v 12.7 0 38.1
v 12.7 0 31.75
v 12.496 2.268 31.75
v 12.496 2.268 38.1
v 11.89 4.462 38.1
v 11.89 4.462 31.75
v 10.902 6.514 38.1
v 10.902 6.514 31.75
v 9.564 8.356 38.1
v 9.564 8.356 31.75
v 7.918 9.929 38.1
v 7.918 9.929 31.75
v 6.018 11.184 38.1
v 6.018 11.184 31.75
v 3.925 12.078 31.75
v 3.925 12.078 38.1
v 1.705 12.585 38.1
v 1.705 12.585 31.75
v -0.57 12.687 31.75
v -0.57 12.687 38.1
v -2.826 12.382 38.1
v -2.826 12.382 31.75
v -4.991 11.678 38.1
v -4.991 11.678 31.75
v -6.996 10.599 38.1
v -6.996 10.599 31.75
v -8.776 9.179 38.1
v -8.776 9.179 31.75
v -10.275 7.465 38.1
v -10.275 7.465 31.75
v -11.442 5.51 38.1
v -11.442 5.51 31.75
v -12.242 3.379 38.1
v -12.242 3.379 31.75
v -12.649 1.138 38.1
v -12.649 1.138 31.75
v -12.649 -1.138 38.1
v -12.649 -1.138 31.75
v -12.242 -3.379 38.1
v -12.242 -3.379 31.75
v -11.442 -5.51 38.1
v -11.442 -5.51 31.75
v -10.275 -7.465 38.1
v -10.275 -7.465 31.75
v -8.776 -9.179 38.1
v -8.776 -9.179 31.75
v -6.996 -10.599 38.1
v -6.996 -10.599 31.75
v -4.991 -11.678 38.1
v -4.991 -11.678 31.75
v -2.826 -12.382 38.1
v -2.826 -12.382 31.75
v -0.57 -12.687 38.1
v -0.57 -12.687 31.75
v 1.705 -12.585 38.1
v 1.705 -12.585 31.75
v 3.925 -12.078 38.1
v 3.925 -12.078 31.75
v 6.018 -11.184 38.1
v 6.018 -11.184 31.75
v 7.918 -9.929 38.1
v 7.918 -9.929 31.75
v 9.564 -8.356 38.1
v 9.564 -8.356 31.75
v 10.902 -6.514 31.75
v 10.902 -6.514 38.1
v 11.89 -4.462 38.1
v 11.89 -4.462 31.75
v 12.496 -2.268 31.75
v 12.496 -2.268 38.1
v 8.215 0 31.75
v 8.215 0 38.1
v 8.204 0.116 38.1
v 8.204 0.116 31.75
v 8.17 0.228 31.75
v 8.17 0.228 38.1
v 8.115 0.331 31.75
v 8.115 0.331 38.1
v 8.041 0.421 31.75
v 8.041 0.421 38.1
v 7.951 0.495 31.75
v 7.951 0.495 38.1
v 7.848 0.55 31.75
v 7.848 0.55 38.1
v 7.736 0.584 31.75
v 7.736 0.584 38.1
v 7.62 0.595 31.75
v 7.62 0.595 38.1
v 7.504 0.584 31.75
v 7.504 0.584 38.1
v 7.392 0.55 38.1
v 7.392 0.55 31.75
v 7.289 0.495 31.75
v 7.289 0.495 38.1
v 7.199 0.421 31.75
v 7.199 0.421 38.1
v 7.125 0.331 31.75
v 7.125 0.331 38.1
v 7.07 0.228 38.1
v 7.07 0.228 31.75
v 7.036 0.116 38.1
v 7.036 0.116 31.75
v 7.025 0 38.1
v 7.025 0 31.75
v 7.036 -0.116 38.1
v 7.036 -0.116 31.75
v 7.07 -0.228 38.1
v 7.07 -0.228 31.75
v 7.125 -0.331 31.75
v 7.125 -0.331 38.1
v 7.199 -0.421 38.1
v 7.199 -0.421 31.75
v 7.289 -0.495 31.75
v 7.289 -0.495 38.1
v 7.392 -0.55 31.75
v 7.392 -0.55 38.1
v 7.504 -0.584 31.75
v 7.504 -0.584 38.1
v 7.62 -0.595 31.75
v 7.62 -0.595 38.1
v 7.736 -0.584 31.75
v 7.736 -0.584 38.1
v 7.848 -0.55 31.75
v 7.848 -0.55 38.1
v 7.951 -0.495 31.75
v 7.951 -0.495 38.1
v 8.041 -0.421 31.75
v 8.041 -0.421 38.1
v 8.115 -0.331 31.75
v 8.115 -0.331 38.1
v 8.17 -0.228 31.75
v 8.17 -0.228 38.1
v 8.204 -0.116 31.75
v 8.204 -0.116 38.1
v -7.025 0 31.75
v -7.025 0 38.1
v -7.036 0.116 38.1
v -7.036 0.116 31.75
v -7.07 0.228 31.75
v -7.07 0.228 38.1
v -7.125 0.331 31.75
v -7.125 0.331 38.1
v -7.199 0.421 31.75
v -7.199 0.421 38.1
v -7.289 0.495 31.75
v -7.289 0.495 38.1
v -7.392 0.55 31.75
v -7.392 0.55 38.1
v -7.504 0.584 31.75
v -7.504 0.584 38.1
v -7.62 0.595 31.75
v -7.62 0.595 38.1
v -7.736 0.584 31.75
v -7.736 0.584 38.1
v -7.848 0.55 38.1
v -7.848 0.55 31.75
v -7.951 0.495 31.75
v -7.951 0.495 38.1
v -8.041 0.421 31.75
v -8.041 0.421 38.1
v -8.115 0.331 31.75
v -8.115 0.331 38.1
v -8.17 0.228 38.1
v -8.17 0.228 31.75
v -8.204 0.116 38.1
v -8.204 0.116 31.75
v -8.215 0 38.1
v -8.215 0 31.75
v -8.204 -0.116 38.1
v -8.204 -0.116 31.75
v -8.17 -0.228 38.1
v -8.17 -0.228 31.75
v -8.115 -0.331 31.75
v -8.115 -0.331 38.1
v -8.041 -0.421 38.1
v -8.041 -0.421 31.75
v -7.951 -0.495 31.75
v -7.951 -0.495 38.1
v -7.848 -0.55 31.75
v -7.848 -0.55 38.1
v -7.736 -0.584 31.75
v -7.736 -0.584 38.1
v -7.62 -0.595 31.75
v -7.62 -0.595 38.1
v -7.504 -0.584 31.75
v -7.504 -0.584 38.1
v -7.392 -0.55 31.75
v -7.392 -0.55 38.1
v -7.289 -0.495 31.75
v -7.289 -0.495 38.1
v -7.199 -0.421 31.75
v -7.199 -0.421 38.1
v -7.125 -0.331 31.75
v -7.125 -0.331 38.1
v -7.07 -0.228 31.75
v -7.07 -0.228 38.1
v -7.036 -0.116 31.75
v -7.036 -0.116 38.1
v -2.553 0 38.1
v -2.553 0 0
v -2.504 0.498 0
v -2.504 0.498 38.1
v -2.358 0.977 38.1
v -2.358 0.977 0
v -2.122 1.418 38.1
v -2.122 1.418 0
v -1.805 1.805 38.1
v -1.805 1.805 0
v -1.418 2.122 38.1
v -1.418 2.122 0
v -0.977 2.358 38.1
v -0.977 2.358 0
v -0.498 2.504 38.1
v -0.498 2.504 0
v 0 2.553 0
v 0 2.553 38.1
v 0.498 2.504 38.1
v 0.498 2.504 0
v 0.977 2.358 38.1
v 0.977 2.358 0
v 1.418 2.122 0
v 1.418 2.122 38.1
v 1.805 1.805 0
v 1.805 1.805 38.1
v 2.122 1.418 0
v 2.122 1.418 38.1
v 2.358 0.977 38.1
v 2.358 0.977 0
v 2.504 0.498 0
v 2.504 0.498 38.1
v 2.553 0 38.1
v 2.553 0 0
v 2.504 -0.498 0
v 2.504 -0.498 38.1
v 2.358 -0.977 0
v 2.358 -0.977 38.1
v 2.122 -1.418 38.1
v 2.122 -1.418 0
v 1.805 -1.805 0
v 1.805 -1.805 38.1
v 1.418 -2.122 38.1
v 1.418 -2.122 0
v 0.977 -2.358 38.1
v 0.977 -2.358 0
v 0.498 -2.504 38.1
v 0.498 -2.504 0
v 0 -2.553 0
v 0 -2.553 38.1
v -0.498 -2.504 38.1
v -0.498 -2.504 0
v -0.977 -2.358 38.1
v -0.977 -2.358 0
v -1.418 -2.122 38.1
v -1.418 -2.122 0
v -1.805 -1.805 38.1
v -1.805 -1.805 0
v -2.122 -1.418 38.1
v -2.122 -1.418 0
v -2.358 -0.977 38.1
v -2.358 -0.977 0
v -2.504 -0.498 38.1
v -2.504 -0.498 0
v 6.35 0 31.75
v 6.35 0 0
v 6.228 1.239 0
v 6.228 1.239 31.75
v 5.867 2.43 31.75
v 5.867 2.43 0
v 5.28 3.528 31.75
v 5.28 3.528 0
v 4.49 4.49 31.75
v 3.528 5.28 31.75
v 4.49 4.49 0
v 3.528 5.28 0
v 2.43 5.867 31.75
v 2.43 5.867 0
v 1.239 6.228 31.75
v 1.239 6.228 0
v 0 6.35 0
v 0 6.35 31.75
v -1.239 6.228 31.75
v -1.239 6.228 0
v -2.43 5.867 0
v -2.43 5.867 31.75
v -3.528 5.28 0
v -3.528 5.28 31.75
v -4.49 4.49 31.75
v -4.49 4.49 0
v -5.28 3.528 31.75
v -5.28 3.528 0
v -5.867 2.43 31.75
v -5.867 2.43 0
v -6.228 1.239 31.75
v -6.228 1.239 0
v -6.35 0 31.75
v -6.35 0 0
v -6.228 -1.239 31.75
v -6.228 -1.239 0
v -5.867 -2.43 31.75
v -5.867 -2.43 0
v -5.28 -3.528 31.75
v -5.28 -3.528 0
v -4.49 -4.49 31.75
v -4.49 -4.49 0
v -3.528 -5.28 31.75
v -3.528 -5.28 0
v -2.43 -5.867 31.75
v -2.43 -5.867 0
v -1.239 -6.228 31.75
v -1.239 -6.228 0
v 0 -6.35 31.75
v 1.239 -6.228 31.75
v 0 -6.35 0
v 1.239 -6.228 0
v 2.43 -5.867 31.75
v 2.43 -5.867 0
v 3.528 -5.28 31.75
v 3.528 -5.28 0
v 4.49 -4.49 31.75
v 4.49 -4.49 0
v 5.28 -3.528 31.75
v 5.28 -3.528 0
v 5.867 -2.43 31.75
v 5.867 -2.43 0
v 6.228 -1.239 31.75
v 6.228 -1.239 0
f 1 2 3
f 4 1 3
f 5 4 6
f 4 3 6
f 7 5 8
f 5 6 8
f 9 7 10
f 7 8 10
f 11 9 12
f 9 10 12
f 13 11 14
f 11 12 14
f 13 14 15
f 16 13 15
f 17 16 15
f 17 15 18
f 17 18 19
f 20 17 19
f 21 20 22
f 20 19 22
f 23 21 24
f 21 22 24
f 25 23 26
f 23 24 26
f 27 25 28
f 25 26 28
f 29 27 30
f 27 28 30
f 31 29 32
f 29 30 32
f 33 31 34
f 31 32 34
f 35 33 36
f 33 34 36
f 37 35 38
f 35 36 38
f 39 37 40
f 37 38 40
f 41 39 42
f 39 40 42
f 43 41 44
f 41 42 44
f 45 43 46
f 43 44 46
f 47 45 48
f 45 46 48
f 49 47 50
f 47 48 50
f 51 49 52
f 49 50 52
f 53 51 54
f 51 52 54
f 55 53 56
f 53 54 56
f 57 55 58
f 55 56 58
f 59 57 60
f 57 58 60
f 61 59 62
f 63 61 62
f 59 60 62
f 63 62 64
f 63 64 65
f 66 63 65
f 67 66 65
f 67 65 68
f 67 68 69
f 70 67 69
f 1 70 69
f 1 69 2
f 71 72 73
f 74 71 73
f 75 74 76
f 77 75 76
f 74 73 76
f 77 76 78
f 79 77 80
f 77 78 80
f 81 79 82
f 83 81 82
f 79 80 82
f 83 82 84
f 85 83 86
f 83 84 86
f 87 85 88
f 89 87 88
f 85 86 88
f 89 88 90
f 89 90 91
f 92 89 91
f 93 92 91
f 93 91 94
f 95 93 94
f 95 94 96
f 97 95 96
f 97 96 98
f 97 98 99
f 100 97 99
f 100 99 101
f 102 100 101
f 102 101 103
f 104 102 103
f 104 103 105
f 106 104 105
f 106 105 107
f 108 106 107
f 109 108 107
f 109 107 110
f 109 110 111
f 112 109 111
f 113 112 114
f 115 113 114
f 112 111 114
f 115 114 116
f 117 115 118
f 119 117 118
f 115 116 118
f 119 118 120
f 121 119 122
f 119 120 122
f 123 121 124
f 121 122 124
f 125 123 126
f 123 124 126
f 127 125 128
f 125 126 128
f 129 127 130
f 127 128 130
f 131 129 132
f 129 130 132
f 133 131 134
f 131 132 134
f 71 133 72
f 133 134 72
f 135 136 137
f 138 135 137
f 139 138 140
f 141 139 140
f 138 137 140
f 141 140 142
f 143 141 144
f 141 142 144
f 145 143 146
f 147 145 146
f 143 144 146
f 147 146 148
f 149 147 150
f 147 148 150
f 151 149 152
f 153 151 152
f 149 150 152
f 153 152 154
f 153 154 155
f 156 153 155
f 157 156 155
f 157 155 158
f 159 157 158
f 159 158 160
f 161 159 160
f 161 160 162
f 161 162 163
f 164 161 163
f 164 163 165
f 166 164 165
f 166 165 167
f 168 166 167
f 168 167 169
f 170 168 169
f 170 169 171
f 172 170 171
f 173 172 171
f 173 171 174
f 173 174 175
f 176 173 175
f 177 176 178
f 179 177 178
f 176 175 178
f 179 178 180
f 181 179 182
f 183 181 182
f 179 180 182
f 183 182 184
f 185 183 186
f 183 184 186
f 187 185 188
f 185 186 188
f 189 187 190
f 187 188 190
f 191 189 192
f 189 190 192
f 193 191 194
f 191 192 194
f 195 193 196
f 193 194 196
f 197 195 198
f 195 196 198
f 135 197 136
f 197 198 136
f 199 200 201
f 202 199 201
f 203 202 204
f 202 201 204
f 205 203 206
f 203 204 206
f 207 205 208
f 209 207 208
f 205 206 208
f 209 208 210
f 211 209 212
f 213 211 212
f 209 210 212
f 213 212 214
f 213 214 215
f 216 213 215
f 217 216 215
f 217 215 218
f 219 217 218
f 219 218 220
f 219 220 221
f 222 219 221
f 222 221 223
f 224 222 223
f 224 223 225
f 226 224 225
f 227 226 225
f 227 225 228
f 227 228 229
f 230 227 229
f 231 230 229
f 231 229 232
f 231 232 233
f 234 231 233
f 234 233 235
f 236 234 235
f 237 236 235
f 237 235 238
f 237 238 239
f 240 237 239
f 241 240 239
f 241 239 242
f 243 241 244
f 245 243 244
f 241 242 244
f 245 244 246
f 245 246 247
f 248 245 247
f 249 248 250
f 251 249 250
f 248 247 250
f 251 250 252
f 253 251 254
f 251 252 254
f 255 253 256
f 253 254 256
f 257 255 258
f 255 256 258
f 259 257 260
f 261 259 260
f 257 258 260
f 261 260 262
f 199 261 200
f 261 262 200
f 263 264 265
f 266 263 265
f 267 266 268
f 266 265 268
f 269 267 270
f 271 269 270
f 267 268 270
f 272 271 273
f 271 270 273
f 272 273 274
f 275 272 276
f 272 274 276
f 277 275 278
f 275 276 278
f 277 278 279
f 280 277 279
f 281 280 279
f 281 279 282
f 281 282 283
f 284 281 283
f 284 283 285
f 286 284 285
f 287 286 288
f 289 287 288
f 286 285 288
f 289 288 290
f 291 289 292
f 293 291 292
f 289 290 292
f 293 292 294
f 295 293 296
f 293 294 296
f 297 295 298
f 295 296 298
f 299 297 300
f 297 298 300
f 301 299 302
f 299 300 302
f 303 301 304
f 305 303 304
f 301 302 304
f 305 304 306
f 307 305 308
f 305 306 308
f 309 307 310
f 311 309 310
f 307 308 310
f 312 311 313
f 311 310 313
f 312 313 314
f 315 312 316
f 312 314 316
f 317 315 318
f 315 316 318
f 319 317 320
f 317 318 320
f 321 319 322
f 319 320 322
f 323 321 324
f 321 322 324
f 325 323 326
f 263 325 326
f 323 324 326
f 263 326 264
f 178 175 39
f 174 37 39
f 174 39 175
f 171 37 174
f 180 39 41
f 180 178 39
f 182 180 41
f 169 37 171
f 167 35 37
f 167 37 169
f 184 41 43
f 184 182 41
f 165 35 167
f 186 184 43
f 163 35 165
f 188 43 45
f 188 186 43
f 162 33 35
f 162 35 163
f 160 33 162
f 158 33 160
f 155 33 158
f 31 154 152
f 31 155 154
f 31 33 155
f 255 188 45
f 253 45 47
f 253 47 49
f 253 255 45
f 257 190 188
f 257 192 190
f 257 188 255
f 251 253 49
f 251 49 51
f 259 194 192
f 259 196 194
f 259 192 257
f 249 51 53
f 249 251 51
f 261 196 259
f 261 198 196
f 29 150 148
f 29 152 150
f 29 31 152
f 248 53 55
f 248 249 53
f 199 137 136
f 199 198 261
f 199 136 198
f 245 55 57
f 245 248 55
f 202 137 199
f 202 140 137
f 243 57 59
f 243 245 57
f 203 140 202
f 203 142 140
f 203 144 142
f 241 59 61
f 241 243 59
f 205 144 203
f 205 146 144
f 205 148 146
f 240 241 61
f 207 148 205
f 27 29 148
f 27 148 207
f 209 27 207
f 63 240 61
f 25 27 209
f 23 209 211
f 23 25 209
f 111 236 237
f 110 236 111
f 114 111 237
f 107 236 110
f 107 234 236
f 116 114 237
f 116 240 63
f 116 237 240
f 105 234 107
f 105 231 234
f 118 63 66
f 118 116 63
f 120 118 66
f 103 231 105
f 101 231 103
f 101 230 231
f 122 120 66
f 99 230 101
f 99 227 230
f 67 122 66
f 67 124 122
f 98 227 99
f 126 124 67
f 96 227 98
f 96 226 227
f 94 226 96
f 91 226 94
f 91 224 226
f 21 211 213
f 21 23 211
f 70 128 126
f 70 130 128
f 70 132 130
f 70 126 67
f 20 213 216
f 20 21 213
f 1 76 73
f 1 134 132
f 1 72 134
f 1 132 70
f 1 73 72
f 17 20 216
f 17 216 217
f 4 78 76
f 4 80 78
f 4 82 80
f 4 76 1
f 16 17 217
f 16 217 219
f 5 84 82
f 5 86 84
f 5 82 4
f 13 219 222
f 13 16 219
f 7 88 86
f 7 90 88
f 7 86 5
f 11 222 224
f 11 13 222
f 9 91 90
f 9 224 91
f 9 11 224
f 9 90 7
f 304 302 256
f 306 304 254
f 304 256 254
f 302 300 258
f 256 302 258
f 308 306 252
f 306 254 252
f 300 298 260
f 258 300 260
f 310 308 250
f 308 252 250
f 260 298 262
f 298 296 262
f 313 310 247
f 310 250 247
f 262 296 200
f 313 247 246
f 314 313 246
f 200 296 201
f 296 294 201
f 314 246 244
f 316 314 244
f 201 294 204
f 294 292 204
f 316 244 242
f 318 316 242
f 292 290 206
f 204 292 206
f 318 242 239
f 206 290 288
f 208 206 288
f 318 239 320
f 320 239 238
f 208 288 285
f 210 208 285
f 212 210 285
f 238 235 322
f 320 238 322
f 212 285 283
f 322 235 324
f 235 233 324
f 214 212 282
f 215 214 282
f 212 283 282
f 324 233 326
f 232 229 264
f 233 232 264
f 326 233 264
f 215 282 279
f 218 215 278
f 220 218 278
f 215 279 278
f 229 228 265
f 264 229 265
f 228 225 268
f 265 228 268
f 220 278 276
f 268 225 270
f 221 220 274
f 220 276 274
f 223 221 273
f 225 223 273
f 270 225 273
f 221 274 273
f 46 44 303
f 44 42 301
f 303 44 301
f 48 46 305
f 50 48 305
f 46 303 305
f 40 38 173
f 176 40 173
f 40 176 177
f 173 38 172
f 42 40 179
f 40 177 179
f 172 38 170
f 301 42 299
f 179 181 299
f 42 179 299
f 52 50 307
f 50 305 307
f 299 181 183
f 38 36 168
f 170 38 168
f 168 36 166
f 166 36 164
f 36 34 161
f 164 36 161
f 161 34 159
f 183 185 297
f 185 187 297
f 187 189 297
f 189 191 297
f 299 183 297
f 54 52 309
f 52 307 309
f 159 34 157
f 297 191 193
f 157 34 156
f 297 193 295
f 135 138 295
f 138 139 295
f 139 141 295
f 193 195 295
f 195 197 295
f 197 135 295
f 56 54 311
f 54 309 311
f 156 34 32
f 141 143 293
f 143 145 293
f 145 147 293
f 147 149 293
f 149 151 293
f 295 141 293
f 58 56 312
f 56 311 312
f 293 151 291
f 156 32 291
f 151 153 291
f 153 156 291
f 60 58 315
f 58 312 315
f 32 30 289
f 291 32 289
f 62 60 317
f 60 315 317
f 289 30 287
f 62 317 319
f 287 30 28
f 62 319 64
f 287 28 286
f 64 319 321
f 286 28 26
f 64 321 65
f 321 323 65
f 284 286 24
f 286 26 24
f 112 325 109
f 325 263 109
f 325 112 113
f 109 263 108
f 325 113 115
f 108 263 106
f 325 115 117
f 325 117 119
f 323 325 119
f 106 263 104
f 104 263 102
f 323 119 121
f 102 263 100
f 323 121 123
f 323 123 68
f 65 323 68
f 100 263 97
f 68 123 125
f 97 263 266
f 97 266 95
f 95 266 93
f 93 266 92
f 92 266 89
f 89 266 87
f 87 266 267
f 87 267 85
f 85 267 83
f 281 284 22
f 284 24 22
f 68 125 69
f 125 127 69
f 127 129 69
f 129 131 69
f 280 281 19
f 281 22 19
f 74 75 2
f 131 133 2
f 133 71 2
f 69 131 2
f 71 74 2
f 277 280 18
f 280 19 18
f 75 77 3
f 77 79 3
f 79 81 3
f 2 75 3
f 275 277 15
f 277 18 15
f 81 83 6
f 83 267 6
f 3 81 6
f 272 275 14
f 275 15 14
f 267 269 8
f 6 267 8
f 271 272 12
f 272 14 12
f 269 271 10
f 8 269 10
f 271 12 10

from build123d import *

# Parameters (mm, degrees)
SKETCH1_R               = 6.35
SKETCH1_R_2             = 2.5527
BOSS_EXTRUDE1_DEPTH     = 31.75
SKETCH2_R               = 12.7
SKETCH2_R_2             = 2.5527
BOSS_EXTRUDE2_DEPTH     = 6.35
SKETCH3_R               = 0.5953125
CUT_EXTRUDE1_DEPTH      = 43.121134838
BOSS_EXTRUDE3_START     = -38.1
SKETCH11_R              = 2.5527
BOSS_EXTRUDE3_DEPTH     = 38.1
F_1_4_20_TAPPED_HOLE3_D = 5.1054


with BuildPart() as part:
    # Sketch1 → Boss-Extrude1 (new body)
    with BuildSketch(Plane.XY):
        Circle(SKETCH1_R)
        Circle(SKETCH1_R_2, mode=Mode.SUBTRACT)
    extrude(amount=BOSS_EXTRUDE1_DEPTH)

    # Sketch2 → Boss-Extrude2 (add)
    with BuildSketch(Plane.XY.offset(31.75)):
        Circle(SKETCH2_R)
        Circle(SKETCH2_R_2, mode=Mode.SUBTRACT)
    extrude(amount=BOSS_EXTRUDE2_DEPTH)

    # Sketch3 → Cut-Extrude1 (cut, through all)
    with BuildSketch(Plane.XY.offset(38.1)):
        with Locations((-7.62, 0)):
            Circle(SKETCH3_R)
        with Locations((7.62, 0)):
            Circle(SKETCH3_R)
    extrude(amount=-CUT_EXTRUDE1_DEPTH, mode=Mode.SUBTRACT)

    # Sketch11 → Boss-Extrude3 (add)
    with BuildSketch(Plane.XY.offset(38.1).offset(BOSS_EXTRUDE3_START)):
        Circle(SKETCH11_R)
    extrude(amount=BOSS_EXTRUDE3_DEPTH)

    # 1/4-20 Tapped Hole3 (through all)
    with Locations(Plane.XY.offset(38.1)):
        with Locations((0, 0)):
            Hole(F_1_4_20_TAPPED_HOLE3_D / 2)


solid = part.part
